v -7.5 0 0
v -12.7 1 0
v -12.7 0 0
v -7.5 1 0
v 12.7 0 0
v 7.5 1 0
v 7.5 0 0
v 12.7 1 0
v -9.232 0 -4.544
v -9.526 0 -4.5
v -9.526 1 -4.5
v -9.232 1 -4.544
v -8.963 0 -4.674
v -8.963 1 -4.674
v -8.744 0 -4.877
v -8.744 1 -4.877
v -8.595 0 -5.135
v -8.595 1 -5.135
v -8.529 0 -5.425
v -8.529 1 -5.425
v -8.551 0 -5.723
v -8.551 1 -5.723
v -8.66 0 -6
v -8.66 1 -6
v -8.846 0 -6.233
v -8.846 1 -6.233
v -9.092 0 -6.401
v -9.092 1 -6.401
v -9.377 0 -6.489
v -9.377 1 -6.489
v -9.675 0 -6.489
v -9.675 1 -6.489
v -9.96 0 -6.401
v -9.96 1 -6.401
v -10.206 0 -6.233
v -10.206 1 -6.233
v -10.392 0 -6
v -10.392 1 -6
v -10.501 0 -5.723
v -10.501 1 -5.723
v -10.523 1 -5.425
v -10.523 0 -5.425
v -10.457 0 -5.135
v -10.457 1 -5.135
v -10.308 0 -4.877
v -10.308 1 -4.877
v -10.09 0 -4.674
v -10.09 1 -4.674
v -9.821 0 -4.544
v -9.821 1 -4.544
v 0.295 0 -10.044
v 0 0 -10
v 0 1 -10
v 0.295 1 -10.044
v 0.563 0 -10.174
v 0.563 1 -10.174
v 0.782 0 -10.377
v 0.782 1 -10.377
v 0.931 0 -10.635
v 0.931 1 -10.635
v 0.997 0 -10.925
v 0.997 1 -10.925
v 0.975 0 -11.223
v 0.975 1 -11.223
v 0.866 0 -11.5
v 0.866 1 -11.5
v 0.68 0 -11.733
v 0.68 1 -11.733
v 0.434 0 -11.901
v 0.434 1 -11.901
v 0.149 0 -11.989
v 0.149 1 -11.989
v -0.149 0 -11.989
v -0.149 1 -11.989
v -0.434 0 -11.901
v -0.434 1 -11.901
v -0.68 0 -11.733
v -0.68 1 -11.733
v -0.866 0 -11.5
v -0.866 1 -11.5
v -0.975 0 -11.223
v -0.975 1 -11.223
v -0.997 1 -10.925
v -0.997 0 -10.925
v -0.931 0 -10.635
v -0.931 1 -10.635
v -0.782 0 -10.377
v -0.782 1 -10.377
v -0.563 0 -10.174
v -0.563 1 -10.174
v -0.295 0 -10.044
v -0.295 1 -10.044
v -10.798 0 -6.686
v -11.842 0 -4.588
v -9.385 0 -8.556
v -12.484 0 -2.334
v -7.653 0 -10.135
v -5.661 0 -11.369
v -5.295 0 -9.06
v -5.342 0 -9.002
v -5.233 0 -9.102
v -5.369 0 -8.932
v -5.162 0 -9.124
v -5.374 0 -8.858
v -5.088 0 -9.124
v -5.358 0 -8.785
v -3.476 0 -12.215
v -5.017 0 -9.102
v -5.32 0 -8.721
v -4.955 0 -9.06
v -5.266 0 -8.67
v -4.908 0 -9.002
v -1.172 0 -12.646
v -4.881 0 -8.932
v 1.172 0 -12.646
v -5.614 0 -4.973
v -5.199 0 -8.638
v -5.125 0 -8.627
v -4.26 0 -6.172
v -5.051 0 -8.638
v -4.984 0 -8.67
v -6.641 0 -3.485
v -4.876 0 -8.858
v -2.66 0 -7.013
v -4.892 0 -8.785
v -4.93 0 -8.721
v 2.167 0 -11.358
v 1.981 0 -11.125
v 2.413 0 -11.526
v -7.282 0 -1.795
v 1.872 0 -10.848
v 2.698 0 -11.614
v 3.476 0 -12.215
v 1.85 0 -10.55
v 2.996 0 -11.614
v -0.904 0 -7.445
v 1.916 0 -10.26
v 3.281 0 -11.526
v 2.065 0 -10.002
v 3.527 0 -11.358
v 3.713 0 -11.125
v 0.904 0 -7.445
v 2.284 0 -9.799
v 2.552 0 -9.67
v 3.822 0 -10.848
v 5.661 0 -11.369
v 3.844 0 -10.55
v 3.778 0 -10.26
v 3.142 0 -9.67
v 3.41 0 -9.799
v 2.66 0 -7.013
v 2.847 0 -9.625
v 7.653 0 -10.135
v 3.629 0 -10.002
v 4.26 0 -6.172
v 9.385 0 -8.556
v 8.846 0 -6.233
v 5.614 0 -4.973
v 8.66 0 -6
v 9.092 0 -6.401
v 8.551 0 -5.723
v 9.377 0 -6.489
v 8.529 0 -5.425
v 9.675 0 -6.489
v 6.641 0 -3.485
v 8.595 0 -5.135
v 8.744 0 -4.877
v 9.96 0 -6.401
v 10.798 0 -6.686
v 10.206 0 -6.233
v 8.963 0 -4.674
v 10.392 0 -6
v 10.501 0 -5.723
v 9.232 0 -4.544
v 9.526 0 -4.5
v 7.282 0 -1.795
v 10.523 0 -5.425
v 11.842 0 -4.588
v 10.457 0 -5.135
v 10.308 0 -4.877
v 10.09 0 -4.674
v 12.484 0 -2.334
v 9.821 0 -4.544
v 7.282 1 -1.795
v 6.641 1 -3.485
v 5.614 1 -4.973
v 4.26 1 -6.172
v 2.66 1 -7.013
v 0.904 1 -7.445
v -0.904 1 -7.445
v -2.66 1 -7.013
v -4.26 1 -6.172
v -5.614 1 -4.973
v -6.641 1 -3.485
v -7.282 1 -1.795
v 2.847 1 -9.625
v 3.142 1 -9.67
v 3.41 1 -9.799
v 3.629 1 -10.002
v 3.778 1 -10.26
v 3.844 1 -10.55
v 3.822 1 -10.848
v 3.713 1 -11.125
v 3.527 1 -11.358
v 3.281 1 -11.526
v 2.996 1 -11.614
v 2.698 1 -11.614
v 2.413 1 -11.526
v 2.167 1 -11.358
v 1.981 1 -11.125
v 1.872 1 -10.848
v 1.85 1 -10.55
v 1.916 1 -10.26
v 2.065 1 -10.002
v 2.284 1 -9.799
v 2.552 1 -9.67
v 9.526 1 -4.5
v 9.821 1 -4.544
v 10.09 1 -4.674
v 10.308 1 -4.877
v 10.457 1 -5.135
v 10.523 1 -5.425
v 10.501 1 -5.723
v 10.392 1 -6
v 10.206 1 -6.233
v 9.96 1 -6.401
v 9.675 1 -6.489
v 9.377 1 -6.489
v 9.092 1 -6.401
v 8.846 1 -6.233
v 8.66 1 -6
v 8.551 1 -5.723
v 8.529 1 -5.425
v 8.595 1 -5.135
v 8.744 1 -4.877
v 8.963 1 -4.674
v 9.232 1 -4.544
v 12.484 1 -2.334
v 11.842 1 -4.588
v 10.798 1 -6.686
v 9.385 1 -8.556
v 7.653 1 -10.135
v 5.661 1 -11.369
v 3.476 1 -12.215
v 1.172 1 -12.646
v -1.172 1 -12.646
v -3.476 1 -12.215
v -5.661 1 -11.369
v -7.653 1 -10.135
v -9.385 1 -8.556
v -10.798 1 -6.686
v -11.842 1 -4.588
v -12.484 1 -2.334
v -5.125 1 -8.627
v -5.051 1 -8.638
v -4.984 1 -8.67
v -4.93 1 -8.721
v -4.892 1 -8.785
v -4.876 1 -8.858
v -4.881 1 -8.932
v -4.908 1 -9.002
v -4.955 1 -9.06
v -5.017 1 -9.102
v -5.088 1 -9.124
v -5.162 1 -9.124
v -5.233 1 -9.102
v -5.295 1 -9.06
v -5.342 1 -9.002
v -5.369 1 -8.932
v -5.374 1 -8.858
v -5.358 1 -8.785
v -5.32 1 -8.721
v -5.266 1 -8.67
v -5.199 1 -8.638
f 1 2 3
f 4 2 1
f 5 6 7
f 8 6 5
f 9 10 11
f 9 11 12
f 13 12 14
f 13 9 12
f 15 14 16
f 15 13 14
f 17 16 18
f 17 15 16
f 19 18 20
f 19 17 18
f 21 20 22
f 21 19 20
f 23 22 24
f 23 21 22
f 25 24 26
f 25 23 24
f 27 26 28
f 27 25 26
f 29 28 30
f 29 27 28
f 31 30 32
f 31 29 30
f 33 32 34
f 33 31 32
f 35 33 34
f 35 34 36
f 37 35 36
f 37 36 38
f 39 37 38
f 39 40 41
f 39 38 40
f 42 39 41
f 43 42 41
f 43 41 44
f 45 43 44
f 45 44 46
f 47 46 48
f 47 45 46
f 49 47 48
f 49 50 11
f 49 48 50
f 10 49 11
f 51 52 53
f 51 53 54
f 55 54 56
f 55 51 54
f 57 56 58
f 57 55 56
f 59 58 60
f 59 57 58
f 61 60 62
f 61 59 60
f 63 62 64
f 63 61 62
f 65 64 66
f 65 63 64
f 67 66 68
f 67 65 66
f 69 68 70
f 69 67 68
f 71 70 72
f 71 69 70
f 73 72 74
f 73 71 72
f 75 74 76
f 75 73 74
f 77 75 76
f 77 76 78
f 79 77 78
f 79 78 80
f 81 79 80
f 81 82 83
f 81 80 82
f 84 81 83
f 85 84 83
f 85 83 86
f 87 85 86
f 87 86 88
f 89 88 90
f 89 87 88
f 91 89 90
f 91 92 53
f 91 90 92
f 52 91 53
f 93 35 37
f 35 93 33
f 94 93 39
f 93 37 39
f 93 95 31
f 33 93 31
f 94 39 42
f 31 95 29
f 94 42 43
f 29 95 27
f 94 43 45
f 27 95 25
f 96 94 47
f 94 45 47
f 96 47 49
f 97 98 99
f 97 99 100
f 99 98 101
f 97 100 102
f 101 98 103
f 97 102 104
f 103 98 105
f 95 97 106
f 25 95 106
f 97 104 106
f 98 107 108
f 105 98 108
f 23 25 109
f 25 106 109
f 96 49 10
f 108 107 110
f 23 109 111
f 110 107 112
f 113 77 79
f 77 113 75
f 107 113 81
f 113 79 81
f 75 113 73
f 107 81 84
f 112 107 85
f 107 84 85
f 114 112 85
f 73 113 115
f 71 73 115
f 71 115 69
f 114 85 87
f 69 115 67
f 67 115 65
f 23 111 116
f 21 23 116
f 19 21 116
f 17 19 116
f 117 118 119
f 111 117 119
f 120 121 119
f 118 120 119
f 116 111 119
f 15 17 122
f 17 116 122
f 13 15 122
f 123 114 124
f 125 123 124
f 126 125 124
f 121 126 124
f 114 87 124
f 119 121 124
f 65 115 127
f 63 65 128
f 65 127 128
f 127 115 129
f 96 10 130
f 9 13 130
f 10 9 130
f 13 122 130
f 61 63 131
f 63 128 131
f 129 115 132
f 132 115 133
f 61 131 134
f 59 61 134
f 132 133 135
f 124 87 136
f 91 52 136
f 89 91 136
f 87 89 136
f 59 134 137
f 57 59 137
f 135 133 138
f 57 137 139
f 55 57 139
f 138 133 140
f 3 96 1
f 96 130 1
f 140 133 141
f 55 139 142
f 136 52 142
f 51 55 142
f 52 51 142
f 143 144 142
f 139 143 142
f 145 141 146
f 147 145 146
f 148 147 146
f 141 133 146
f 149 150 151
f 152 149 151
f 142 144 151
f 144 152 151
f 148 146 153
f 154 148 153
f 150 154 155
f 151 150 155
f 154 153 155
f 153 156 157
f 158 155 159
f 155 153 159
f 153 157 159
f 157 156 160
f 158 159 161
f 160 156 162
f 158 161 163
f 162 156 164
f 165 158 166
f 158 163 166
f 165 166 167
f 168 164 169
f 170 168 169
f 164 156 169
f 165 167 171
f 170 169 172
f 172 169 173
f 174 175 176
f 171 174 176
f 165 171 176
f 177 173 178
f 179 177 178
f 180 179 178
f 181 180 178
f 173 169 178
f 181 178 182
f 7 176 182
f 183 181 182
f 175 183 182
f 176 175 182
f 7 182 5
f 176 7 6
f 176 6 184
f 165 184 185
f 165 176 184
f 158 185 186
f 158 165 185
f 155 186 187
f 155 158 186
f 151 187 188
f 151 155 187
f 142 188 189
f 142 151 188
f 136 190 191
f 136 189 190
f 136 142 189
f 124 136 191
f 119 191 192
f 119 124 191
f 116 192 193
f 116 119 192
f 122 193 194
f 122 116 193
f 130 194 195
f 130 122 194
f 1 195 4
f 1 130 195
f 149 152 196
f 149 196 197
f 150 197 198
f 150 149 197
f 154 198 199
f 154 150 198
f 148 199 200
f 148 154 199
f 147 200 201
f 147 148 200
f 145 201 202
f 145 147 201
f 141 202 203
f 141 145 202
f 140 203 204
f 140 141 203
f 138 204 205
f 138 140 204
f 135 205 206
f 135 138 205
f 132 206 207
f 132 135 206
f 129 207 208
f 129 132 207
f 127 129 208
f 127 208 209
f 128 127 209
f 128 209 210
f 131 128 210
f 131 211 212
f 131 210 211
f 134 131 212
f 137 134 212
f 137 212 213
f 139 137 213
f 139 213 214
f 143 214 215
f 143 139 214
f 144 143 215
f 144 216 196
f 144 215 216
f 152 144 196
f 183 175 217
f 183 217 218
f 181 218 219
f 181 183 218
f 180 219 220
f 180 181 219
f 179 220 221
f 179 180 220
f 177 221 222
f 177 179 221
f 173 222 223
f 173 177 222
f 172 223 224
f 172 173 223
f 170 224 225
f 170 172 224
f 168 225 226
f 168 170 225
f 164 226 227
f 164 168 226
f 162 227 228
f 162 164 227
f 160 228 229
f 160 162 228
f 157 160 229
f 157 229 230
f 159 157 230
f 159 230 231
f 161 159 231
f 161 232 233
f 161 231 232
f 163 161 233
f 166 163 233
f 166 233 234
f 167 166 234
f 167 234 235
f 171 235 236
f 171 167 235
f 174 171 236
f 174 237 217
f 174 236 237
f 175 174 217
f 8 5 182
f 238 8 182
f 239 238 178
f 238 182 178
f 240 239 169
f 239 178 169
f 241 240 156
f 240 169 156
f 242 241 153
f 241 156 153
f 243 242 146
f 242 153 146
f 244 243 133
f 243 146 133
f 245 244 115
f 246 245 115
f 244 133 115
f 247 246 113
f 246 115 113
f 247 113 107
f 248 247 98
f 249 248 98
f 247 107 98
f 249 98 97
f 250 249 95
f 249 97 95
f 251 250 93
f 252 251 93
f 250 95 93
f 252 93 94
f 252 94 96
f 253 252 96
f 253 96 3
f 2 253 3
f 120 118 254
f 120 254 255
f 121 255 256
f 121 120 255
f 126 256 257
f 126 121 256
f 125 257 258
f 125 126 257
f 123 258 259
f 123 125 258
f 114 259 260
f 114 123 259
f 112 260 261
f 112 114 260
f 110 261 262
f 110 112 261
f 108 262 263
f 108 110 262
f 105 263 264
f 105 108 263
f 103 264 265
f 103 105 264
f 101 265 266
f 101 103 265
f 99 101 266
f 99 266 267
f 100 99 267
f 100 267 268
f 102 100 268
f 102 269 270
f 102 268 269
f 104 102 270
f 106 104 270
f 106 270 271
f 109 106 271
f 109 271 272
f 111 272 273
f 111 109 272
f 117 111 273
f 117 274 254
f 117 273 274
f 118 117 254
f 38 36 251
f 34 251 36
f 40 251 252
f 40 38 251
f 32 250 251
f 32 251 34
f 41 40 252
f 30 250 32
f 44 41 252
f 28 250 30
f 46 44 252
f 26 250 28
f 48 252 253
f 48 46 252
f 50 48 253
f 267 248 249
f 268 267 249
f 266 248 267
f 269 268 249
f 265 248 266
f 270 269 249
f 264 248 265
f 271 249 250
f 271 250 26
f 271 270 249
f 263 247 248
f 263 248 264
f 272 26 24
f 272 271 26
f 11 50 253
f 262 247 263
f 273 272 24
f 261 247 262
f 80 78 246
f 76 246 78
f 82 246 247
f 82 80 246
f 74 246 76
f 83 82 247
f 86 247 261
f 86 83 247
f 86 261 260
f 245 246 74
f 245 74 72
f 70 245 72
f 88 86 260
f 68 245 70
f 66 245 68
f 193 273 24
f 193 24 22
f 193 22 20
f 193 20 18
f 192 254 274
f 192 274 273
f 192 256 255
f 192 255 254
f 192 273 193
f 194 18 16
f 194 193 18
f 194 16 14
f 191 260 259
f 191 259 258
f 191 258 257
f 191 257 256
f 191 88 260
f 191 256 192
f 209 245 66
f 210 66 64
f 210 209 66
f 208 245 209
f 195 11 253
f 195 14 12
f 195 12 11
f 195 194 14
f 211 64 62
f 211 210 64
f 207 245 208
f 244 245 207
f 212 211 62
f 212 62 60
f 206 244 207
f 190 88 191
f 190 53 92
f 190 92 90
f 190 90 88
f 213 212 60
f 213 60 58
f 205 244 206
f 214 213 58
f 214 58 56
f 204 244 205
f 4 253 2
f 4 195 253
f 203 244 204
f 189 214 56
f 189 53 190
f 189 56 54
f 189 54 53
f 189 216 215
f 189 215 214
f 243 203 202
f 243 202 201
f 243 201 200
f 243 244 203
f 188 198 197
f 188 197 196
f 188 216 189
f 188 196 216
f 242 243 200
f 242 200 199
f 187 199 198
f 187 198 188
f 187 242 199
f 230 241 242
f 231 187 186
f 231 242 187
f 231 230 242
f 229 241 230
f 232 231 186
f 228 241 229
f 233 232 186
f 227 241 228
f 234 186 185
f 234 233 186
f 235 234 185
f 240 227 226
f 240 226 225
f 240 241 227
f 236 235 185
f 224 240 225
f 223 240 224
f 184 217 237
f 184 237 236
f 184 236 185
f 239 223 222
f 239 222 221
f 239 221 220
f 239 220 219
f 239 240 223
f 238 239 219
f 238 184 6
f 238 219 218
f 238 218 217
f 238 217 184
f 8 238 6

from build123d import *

# Parameters (mm, degrees)
SKETCH1_R               = 12.7
BOSS_EXTRUDE1_DEPTH     = 1
CUT_EXTRUDE1_DEPTH      = 18.98832955
CUT_EXTRUDE1_DEPTH_BACK = 18.98832955
SKETCH19_R              = 1
CUT_EXTRUDE2_DEPTH      = 18.98832955
CUT_EXTRUDE2_DEPTH_BACK = 18.98832955
SKETCH20_R              = 7.5
SKETCH21_W              = 65.874202484
SKETCH21_H              = 51.979273979
CUT_EXTRUDE3_DEPTH      = 18.98832955
CUT_EXTRUDE4_DEPTH      = 18.98832955
CUT_EXTRUDE4_DEPTH_BACK = 18.98832955
SKETCH22_R              = 1
SKETCH22_R_2            = 0.25


with BuildPart() as part:
    # Sketch1 → Boss-Extrude1 (new body)
    with BuildSketch(Plane(origin=(0, 0, 0), x_dir=(1, 0, 0), z_dir=(0, 1, 0))):
        with Locations(Location((0, 0, 0), (0, 0, 270))):
            Circle(SKETCH1_R)
    extrude(amount=BOSS_EXTRUDE1_DEPTH)

    # Sketch19 → Cut-Extrude1 (cut, two sides: drawn at the far end of the back side and taken through both)
    with BuildSketch(Plane(origin=(0, 1, 0), x_dir=(1, 0, 0), z_dir=(0, 1, 0)).offset(-CUT_EXTRUDE1_DEPTH_BACK)):
        with Locations(Location((0, 11, 0), (0, 0, 270))):
            Circle(SKETCH19_R)
        with Locations(Location((9.526279442, 5.5, 0), (0, 0, 270))):
            Circle(SKETCH19_R)
        with Locations(Location((9.526279442, -5.5, 0), (0, 0, 270))):
            Circle(SKETCH19_R)
        with Locations(Location((0, -11, 0), (0, 0, 270))):
            Circle(SKETCH19_R)
        with Locations(Location((-9.526279442, -5.5, 0), (0, 0, 270))):
            Circle(SKETCH19_R)
        with Locations(Location((-9.526279442, 5.5, 0), (0, 0, 270))):
            Circle(SKETCH19_R)
    extrude(amount=CUT_EXTRUDE1_DEPTH + CUT_EXTRUDE1_DEPTH_BACK, mode=Mode.SUBTRACT)

    # Sketch20 → Cut-Extrude2 (cut, two sides: drawn at the far end of the back side and taken through both)
    with BuildSketch(Plane(origin=(0, 1, 0), x_dir=(1, 0, 0), z_dir=(0, 1, 0)).offset(-CUT_EXTRUDE2_DEPTH_BACK)):
        with Locations(Location((0, 0, 0), (0, 0, 270))):
            Circle(SKETCH20_R)
    extrude(amount=CUT_EXTRUDE2_DEPTH + CUT_EXTRUDE2_DEPTH_BACK, mode=Mode.SUBTRACT)

    # Sketch21 → Cut-Extrude3 (cut, through all)
    with BuildSketch(Plane.XY):
        with Locations((-3.816154381, 6.321647006)):
            Rectangle(SKETCH21_W, SKETCH21_H)
    extrude(amount=CUT_EXTRUDE3_DEPTH, mode=Mode.SUBTRACT)

    # Sketch22 → Cut-Extrude4 (cut, two sides: drawn at the far end of the back side and taken through both)
    with BuildSketch(Plane(origin=(0, 1, 0), x_dir=(1, 0, 0), z_dir=(0, 1, 0)).offset(-CUT_EXTRUDE4_DEPTH_BACK)):
        with Locations(Location((2.847009496, 10.625184089, 0), (0, 0, 270))):
            Circle(SKETCH22_R)
        with Locations(Location((-5.125, 8.876760389, 0), (0, 0, 270))):
            Circle(SKETCH22_R_2)
    extrude(amount=CUT_EXTRUDE4_DEPTH + CUT_EXTRUDE4_DEPTH_BACK, mode=Mode.SUBTRACT)


solid = part.part
